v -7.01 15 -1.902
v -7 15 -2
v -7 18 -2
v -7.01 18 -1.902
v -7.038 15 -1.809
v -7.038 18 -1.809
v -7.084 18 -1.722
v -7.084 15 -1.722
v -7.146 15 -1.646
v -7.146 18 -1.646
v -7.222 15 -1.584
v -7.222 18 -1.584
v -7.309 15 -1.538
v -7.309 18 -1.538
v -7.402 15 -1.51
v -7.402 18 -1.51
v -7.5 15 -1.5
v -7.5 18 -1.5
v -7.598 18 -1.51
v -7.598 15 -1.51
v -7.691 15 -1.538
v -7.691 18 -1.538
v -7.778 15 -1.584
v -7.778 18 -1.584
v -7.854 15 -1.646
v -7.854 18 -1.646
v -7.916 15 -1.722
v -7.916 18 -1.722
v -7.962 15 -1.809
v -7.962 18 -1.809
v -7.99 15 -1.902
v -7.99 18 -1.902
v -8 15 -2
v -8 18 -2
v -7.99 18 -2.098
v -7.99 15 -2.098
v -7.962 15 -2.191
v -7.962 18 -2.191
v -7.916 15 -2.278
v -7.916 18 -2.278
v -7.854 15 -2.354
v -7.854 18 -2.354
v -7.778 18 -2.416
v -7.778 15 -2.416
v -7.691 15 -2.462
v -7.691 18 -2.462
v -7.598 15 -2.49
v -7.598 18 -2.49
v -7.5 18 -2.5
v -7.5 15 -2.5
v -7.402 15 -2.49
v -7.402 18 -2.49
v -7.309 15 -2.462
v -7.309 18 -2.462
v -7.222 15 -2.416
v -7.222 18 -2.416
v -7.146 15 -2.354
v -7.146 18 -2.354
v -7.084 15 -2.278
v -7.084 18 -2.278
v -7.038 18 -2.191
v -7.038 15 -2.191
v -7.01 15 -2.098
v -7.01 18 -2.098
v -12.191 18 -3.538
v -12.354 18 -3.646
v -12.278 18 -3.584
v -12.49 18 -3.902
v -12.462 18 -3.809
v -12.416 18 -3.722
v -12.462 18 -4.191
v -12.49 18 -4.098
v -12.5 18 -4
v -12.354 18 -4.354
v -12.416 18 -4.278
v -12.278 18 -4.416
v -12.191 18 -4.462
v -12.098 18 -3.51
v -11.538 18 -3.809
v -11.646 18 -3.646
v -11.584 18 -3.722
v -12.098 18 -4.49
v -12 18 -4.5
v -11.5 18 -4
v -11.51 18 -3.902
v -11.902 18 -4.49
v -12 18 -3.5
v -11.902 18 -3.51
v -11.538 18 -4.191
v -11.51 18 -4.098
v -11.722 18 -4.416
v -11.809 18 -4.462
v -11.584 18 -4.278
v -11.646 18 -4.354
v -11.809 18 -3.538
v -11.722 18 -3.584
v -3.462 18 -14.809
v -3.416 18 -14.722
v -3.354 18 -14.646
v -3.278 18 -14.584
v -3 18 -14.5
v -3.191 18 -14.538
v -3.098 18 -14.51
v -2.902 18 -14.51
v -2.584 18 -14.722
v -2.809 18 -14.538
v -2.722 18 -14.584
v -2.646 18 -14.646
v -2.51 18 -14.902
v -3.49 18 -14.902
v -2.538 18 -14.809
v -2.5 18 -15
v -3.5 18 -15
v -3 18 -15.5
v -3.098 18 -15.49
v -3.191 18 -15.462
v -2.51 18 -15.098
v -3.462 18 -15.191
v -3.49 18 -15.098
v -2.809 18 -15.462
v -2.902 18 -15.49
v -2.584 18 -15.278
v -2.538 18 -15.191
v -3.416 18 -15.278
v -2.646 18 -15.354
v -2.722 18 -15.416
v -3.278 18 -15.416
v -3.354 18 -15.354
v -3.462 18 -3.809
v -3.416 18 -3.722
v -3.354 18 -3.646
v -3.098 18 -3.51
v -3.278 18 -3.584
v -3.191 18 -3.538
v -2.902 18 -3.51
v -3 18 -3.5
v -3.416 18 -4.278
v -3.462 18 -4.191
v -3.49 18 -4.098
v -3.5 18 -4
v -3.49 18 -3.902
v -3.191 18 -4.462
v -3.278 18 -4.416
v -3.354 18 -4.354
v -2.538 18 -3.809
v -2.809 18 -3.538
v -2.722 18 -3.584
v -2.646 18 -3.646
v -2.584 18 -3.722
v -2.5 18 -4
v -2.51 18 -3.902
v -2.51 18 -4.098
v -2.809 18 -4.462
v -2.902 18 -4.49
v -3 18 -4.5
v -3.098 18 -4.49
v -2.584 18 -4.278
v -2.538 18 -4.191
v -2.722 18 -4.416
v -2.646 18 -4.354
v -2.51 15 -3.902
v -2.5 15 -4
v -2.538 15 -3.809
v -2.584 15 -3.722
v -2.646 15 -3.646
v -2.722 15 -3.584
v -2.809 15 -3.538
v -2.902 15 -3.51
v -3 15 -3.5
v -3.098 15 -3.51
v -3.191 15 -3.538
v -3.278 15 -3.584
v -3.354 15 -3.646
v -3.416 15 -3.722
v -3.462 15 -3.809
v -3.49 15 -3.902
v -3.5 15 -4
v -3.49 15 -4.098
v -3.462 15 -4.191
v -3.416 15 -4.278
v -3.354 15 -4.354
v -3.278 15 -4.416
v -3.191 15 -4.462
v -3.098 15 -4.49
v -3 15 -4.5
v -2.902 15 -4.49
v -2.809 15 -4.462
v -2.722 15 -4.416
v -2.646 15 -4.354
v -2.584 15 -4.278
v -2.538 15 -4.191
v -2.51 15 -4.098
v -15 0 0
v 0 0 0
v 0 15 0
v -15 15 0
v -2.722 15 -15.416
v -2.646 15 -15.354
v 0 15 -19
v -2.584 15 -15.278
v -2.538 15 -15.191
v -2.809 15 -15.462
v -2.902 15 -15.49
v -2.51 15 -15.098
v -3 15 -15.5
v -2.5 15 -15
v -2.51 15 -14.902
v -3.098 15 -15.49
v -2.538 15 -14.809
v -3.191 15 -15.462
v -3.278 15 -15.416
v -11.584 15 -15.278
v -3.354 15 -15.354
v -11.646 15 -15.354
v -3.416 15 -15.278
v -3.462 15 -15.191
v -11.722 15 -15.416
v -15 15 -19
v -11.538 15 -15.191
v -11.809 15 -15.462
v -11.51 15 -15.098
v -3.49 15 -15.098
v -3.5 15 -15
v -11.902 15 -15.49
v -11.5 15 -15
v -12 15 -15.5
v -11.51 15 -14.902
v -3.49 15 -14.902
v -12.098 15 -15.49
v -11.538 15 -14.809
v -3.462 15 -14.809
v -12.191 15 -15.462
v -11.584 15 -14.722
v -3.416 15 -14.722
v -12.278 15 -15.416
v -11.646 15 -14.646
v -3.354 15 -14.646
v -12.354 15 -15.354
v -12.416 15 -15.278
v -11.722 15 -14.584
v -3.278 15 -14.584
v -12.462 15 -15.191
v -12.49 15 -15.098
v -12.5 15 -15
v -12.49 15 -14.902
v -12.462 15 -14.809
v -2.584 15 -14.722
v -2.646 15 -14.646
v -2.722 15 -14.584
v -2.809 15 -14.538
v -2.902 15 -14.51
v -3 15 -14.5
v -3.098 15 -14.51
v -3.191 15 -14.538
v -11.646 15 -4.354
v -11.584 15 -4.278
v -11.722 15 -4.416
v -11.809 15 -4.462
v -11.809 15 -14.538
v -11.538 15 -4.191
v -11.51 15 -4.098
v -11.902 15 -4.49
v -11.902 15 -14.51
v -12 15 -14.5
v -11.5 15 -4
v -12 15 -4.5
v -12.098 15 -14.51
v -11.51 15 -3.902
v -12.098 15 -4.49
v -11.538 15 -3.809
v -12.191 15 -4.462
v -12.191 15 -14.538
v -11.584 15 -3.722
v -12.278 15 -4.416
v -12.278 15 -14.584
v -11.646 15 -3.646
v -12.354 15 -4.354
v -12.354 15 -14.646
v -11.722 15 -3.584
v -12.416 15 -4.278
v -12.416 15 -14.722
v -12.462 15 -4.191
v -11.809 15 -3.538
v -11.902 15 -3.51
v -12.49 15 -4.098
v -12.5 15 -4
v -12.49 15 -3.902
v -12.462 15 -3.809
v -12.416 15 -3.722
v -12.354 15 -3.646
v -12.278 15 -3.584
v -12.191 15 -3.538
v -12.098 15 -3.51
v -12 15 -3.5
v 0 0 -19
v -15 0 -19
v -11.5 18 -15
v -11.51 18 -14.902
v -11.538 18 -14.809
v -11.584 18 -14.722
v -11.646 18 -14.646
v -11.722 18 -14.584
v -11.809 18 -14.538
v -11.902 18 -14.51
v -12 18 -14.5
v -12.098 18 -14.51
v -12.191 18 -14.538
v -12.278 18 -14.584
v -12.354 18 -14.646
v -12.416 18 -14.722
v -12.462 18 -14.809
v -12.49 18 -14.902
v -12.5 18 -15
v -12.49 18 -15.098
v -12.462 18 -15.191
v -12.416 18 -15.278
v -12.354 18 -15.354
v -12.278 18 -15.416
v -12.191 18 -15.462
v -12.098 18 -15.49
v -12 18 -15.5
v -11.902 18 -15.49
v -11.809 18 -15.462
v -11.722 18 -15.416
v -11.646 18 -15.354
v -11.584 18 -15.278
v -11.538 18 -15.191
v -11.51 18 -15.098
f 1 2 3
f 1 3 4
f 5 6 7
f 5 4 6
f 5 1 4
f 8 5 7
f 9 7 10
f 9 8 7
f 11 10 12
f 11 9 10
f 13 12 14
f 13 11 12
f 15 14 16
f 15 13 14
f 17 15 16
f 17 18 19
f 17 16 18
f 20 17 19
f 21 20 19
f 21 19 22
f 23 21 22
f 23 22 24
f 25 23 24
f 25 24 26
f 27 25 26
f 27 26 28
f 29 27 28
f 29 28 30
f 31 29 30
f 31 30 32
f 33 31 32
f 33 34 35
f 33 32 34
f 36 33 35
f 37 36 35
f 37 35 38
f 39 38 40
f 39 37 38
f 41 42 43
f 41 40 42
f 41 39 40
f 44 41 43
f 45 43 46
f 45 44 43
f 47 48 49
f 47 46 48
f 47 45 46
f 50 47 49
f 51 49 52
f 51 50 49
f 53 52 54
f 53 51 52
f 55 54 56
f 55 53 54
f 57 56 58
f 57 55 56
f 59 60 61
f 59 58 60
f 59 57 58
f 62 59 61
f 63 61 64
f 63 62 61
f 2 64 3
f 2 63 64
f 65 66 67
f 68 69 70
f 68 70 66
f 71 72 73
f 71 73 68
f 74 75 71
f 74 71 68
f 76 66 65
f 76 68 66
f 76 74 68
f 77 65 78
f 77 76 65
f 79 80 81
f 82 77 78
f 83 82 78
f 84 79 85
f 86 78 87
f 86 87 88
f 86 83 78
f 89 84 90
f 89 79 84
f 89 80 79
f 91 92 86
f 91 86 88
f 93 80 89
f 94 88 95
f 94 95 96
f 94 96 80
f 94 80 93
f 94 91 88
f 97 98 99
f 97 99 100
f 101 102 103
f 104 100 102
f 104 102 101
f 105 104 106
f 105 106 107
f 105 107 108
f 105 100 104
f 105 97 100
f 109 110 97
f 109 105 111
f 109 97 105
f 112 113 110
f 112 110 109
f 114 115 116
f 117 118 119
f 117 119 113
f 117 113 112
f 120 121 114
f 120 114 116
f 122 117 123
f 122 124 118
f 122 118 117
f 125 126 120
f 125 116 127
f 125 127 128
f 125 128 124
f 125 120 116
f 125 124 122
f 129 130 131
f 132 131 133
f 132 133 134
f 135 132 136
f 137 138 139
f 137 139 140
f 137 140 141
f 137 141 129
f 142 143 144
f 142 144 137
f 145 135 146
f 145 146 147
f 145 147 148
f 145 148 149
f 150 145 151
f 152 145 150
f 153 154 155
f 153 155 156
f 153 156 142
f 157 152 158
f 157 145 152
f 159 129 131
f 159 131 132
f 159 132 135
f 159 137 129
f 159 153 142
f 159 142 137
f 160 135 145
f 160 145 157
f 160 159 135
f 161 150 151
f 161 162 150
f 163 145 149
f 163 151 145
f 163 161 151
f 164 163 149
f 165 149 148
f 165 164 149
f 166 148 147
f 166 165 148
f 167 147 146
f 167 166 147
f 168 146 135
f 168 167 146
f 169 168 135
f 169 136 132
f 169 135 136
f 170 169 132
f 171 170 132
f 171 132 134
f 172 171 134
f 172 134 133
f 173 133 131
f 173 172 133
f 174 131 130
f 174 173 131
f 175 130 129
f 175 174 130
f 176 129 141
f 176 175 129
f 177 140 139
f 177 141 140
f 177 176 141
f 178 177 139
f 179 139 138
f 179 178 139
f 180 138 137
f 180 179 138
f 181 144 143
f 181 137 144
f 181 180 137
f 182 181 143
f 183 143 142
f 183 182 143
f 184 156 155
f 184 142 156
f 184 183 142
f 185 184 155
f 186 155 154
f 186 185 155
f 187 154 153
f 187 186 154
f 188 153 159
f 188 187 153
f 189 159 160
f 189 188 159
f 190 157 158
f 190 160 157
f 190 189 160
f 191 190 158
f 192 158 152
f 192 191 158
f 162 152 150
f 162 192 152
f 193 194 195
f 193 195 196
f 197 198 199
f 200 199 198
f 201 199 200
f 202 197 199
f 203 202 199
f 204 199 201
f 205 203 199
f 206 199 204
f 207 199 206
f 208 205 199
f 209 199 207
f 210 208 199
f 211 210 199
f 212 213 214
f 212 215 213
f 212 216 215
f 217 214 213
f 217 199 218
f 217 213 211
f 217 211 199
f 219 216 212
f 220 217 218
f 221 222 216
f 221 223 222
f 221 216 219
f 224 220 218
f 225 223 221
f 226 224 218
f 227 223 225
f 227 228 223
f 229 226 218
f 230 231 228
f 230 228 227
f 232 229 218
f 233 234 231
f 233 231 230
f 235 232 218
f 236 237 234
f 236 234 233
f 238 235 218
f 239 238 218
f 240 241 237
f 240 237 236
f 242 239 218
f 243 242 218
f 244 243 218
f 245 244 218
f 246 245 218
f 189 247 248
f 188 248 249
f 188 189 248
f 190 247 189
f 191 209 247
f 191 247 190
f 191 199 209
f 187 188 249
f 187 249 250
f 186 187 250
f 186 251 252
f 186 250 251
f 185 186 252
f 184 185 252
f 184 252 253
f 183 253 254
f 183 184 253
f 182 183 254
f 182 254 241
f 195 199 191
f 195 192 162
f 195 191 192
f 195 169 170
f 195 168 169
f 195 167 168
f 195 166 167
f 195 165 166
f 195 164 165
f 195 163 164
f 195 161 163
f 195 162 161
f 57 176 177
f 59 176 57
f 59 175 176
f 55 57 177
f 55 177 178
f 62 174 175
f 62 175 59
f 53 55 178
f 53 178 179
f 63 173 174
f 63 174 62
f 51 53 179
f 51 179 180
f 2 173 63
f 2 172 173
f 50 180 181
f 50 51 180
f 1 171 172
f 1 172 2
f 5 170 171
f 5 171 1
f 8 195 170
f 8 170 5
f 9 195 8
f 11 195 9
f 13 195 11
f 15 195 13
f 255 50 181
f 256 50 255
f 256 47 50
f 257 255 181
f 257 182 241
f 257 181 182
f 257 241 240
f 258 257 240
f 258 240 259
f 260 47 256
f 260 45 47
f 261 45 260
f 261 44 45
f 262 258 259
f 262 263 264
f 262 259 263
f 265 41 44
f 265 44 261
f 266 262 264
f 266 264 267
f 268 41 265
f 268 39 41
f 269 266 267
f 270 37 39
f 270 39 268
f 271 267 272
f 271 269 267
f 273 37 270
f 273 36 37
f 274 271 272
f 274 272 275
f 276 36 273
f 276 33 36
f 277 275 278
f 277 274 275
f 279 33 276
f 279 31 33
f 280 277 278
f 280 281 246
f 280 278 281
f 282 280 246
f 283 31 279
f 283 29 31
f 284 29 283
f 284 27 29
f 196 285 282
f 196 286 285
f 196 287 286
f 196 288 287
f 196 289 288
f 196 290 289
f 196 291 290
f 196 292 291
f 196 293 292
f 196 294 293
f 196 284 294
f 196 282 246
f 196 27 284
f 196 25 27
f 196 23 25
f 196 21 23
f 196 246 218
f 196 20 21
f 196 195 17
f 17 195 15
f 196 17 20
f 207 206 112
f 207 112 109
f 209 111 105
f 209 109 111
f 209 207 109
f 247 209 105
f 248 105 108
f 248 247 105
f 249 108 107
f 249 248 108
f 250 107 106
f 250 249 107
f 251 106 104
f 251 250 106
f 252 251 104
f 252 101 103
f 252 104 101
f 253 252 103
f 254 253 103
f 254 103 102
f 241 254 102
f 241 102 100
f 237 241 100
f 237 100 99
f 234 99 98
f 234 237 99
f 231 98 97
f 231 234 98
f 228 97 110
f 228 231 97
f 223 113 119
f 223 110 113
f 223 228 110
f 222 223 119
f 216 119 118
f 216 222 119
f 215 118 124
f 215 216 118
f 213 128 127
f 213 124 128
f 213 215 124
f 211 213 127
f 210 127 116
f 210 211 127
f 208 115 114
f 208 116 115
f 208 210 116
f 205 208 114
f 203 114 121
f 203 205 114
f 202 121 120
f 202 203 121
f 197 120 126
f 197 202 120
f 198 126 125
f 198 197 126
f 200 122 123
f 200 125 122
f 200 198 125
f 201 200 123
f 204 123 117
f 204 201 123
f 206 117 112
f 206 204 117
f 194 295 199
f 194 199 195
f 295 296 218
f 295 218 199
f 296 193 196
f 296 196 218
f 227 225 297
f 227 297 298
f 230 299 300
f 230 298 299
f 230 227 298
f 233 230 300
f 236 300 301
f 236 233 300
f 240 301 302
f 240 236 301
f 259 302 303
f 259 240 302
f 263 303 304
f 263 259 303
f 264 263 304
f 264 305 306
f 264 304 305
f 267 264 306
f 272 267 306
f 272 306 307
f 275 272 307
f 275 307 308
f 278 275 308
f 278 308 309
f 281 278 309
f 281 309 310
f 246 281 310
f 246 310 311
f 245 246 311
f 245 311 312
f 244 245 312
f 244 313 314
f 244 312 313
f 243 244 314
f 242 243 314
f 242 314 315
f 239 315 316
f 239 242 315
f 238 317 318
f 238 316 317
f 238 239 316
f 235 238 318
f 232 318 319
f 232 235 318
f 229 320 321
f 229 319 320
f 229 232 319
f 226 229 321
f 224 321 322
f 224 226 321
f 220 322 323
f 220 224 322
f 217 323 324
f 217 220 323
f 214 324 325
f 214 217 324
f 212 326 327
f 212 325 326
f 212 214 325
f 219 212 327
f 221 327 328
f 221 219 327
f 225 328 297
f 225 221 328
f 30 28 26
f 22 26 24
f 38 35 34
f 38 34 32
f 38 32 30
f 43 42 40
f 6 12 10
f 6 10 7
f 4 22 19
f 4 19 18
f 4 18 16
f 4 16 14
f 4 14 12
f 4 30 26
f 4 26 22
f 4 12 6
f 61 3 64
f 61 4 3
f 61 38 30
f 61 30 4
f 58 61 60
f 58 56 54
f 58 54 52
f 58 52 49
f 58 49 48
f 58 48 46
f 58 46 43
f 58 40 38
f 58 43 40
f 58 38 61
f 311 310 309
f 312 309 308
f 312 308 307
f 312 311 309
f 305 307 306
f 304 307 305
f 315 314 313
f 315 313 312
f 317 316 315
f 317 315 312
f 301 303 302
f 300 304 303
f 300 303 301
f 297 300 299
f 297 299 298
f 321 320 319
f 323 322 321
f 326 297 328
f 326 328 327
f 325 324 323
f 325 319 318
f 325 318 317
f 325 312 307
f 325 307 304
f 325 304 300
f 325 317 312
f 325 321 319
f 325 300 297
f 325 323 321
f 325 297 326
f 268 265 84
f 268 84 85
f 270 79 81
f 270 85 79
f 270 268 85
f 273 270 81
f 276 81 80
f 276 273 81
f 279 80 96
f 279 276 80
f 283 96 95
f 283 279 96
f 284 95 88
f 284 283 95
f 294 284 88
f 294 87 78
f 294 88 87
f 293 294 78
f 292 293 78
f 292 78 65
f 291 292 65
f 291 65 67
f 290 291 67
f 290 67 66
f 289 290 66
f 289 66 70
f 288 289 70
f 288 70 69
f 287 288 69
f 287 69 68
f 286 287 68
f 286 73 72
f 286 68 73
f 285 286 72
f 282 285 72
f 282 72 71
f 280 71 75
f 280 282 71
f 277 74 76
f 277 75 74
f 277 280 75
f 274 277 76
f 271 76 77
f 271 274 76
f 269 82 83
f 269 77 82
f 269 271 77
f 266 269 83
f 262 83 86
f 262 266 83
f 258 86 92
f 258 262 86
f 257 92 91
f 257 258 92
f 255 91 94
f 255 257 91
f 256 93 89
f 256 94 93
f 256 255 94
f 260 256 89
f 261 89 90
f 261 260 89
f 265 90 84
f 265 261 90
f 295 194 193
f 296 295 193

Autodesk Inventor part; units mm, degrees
ref_plane "YZ Plane" through (0, 0, 0) normal (1, 0, 0) x (0, 1, 0)
ref_plane "XZ Plane" through (0, 0, 0) normal (0, 1, 0) x (-1, 0, 0)
ref_plane "XY Plane" through (0, 0, 0) normal (0, 0, 1) x (1, 0, 0)
sketch "Sketch1" plane through (0, 0, 0) normal (0, 1, 0) x (-1, 0, 0)
  line L0 (0, 0) -> (15, 0)
  line L1 (15, 0) -> (15, -19)
  line L2 (15, -19) -> (0, -19)
  line L3 (0, -19) -> (0, 0)
  dimension "d0" = 19
  dimension "d1" = 15
extrude "Extrusion1" add sketch "Sketch1" along normal blind 15
sketch "Sketch2" plane through (0, 15, 0) normal (0, 1, 0) x (1, 0, 0)
  circle A0 centre (-3, 4) radius 0.5
  line L0 (0, 0) -> (0, 19) projected
  line L1 (-15, 0) -> (0, 0) projected
  circle A1 centre (-3, 15) radius 0.5
  line L2 (0, 19) -> (-15, 19) projected
  circle A2 centre (-7.5, 2) radius 0.5
  line L3 (-7.5, 0) -> (-7.5, 19) construction
  circle A3 centre (-12, 4) radius 0.5
  circle A4 centre (-12, 15) radius 0.5
  dimension "d4" = 1
  dimension "d5" = 3
  dimension "d6" = 4
  dimension "d7" = 1
  dimension "d8" = 3
  dimension "d9" = 4
  dimension "d10" = 1
  dimension "d11" = 2
extrude "Extrusion2" add sketch "Sketch2" along normal blind 3
sketch "Sketch3" plane through (-12, 18, -4) normal (0, 1, 0) x (1, 0, 0)
  circle A0 centre (4.5, -2) radius 0.5 projected
  circle A1 centre (9, 0) radius 0.5 projected
  circle A2 centre (9, 11) radius 0.5 projected
  circle A3 centre (0, 0) radius 0.5 projected
  circle A4 centre (0, 11) radius 0.5 projected
  point P0 (12, -4)
properties part number "miniRelay"
